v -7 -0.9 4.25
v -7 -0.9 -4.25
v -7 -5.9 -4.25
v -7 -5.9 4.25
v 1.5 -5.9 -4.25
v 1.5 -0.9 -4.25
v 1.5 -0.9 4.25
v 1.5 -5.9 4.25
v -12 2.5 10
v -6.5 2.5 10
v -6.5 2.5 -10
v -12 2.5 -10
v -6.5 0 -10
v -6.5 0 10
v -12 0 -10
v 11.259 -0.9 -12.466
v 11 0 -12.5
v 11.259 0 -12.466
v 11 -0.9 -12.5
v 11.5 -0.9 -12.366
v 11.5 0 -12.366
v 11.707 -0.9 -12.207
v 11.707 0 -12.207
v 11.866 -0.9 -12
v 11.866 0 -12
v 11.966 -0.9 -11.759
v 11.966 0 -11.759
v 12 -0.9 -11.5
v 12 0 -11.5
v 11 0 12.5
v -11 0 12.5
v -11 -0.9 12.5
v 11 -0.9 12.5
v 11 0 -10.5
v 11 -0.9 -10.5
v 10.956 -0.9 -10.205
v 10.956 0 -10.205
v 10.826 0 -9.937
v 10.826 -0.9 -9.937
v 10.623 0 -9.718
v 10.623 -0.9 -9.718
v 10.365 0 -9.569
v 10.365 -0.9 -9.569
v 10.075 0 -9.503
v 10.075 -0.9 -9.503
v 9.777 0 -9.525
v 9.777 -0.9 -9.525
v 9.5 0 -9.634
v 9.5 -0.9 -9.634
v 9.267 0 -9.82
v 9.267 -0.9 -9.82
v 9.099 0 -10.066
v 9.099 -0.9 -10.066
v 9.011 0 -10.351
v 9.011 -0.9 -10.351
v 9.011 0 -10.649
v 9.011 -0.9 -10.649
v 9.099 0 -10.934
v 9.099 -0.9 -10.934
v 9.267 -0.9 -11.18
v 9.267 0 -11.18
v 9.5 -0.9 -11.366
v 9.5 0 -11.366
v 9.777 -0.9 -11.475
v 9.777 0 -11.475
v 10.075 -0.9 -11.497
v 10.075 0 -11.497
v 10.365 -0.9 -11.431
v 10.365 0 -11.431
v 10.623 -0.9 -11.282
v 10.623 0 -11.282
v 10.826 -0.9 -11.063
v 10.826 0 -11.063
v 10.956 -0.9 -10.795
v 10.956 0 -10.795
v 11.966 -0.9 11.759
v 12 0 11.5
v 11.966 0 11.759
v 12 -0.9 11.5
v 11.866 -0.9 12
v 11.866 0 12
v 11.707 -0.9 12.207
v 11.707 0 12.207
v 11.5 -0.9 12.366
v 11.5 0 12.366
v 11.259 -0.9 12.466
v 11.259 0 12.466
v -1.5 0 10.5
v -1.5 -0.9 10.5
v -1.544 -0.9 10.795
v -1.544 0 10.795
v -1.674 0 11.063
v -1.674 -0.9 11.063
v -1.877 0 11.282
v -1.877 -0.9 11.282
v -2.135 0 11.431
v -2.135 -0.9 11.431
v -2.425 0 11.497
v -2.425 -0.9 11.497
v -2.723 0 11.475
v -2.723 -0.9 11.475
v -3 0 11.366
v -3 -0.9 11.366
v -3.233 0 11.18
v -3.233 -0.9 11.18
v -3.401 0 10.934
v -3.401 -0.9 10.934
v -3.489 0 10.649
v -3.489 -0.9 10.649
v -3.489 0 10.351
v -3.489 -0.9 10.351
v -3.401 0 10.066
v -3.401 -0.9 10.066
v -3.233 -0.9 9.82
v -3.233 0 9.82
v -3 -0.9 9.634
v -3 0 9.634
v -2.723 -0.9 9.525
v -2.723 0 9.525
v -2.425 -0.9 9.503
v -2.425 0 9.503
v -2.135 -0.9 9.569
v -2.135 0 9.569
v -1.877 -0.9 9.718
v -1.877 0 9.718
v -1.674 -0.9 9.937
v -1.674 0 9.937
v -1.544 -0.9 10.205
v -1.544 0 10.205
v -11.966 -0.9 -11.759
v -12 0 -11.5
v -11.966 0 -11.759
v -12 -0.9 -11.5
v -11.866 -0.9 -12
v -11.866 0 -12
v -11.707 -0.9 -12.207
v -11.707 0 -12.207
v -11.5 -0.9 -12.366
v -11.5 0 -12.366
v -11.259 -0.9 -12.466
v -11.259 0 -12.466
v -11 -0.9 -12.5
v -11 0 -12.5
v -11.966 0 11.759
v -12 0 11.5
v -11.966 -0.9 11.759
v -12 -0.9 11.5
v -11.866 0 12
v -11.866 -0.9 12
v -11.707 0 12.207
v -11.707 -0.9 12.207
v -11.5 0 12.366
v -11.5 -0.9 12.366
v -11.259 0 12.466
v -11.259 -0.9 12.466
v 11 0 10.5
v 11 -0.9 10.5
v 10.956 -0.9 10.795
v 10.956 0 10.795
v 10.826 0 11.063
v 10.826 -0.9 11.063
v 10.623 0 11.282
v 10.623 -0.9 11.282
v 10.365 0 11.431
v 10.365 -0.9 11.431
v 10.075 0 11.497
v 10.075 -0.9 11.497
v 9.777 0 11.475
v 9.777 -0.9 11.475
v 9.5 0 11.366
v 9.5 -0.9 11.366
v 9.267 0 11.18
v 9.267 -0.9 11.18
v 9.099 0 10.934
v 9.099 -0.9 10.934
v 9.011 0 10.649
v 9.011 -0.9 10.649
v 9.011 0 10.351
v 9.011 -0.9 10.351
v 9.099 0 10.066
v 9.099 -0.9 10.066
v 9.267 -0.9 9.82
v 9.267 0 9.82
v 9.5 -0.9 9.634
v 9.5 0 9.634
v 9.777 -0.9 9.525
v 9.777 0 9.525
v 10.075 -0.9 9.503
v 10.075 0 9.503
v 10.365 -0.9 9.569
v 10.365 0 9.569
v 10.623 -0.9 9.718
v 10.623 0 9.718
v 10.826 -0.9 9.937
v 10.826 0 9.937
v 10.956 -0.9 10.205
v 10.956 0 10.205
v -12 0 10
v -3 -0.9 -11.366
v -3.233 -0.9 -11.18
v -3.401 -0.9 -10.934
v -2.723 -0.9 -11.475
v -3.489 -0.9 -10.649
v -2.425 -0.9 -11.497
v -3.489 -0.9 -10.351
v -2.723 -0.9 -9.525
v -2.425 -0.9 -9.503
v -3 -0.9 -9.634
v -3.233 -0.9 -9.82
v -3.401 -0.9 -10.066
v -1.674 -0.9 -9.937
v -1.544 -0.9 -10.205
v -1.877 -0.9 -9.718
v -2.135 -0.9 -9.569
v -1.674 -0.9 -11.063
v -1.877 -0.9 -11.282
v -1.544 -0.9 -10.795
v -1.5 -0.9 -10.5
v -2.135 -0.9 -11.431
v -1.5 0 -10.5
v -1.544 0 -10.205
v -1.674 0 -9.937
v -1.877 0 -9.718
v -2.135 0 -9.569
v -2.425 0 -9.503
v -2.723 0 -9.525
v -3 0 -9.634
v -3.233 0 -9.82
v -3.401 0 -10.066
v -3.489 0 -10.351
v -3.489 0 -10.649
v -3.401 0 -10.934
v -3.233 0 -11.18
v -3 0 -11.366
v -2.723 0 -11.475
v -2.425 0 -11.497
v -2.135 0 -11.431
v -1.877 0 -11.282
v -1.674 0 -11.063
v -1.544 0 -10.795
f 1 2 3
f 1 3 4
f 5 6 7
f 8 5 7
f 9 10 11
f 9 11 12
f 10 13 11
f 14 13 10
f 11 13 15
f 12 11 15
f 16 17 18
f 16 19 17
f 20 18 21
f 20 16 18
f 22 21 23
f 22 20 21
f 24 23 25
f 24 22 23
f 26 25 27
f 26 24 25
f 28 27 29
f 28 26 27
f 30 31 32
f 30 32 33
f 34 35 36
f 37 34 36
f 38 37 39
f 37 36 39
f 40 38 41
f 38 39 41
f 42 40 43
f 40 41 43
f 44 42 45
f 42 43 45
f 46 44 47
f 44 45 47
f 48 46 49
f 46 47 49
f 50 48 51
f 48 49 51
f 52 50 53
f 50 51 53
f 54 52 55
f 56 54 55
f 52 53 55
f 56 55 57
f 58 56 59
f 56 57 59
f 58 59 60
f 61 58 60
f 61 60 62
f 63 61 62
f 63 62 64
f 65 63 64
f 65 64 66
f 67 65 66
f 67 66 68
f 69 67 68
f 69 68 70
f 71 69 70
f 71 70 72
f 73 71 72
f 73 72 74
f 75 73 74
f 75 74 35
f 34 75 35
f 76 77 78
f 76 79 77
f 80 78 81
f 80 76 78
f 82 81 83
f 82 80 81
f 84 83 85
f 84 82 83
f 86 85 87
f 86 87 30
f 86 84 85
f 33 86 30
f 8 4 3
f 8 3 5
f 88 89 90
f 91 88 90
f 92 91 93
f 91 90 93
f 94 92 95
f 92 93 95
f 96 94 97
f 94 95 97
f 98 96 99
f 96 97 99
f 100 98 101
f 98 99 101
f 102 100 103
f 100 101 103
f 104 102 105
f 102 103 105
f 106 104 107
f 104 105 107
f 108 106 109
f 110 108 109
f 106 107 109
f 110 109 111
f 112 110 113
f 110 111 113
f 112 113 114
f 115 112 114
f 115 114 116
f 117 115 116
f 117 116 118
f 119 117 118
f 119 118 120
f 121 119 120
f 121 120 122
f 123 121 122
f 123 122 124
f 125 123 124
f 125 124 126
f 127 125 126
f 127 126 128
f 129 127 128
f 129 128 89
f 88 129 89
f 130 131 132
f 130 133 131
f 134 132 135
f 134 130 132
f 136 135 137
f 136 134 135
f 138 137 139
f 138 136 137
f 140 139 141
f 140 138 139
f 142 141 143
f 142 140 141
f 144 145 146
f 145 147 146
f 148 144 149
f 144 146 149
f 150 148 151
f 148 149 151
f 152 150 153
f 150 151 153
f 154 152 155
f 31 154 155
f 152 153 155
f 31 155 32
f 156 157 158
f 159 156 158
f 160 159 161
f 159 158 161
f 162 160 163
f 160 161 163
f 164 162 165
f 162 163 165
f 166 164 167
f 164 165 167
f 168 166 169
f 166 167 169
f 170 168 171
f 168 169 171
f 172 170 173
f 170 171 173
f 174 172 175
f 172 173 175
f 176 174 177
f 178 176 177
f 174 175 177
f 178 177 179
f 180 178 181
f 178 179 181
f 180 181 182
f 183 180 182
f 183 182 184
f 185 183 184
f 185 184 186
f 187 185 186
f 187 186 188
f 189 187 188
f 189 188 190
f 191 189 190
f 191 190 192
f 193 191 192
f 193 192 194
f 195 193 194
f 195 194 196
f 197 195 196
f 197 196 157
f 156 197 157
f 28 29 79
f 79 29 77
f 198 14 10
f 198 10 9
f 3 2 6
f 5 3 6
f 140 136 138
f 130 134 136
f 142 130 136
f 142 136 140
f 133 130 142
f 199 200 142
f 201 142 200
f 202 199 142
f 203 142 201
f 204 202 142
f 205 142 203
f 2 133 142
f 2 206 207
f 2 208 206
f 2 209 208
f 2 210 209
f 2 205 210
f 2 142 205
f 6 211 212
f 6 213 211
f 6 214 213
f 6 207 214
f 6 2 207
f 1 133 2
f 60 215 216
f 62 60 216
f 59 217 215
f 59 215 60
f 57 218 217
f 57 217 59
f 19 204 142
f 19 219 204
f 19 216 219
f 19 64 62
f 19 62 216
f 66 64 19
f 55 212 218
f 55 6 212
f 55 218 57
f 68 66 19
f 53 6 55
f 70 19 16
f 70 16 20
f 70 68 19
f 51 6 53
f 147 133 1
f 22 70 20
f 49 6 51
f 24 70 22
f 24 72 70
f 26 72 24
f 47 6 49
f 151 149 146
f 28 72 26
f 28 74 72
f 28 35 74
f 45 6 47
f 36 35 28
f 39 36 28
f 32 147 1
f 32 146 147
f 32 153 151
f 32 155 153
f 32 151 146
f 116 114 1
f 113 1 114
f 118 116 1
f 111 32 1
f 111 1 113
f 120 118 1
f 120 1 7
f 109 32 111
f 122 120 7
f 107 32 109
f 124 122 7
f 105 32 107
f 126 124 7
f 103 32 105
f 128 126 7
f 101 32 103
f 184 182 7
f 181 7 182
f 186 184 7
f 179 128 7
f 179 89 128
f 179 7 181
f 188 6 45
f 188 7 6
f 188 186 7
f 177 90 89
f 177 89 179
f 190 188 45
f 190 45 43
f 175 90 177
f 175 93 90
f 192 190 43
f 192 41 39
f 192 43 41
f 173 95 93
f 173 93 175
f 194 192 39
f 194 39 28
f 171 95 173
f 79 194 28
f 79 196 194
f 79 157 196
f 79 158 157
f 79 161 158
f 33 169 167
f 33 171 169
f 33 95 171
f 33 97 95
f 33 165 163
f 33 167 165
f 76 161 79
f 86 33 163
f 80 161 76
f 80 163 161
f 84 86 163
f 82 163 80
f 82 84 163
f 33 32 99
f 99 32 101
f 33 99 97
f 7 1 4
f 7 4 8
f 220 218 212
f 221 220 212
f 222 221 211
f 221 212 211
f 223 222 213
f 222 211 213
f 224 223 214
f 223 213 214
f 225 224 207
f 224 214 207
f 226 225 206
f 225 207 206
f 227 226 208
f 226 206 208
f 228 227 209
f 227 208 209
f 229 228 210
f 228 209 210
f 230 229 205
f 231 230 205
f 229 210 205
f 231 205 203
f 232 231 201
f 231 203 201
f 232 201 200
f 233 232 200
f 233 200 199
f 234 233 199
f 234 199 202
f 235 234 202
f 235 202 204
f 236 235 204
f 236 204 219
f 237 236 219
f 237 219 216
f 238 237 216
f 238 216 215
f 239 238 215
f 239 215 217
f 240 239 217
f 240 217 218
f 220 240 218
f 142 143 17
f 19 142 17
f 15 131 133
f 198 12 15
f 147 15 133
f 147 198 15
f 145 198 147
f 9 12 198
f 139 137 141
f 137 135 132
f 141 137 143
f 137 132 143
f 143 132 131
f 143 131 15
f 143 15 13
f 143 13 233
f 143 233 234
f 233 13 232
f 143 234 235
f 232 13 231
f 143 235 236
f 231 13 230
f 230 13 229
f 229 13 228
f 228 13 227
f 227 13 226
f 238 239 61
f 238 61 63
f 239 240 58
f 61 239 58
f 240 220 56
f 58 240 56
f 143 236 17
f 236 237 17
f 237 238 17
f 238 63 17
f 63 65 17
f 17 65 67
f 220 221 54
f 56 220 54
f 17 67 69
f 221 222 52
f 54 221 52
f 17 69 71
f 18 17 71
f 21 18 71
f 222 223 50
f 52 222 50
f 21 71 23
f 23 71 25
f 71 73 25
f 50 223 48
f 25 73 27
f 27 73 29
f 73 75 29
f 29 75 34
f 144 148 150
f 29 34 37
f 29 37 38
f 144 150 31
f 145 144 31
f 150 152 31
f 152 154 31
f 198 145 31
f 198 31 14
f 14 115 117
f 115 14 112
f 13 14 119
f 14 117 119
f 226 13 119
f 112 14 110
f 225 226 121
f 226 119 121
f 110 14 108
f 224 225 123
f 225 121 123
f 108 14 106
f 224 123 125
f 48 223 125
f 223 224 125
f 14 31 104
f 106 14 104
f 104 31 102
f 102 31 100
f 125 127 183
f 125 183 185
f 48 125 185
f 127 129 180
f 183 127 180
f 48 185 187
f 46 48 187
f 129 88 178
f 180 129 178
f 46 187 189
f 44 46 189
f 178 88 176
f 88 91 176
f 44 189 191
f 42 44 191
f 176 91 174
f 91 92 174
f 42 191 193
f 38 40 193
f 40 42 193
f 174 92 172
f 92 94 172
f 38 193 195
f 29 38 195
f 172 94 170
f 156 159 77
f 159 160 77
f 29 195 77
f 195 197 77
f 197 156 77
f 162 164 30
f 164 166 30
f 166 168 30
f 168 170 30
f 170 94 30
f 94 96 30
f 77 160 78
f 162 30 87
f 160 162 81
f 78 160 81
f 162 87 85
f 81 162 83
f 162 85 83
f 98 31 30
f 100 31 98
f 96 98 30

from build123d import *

# Parameters (mm, degrees)
F0_W     = 24
F0_H     = 25
F1_DEPTH = 0.9
F2_R     = 1
F3_W     = 8.5
F3_H     = 8.5
F4_DEPTH = 5
F5_R     = 1
F6_DEPTH = 0.901
F7_W     = 5.5
F7_H     = 20
F8_DEPTH = 2.5


with BuildPart() as f1:
    # F0 (on Front) → F1 (new body)
    with BuildSketch(Plane.XZ):
        Rectangle(F0_W, F0_H)
    extrude(amount=F1_DEPTH)

    # F2
    f2_edges = [f1.edges().sort_by_distance(p)[0] for p in [
        (12, -0.45, 12.5),
        (12, -0.45, -12.5),
        (-12, -0.45, -12.5),
        (-12, -0.45, 12.5),
    ]]
    fillet(f2_edges, radius=F2_R)

    # F3 (on face) → F4 (join)
    with BuildSketch(Plane.XZ.offset(0.9)):
        with Locations((-2.75, 0)):
            Rectangle(F3_W, F3_H)
    extrude(amount=F4_DEPTH)

    # F5 (on face) → F6 (cut, through all)
    with BuildSketch(Plane.XZ.offset(0.9)):
        with Locations((10, 10.5)):
            Circle(F5_R)
        with Locations((-2.5, 10.5)):
            Circle(F5_R)
        with Locations((-2.5, -10.5)):
            Circle(F5_R)
        with Locations((10, -10.5)):
            Circle(F5_R)
    extrude(amount=-F6_DEPTH, mode=Mode.SUBTRACT)

    # F7 (on face) → F8 (join)
    with BuildSketch(Plane(origin=(0, 0, 0), x_dir=(-1, 0, 0), z_dir=(0, 1, 0))):
        with Locations((9.25, 0)):
            Rectangle(F7_W, F7_H)
    extrude(amount=F8_DEPTH)


solid = f1.part
